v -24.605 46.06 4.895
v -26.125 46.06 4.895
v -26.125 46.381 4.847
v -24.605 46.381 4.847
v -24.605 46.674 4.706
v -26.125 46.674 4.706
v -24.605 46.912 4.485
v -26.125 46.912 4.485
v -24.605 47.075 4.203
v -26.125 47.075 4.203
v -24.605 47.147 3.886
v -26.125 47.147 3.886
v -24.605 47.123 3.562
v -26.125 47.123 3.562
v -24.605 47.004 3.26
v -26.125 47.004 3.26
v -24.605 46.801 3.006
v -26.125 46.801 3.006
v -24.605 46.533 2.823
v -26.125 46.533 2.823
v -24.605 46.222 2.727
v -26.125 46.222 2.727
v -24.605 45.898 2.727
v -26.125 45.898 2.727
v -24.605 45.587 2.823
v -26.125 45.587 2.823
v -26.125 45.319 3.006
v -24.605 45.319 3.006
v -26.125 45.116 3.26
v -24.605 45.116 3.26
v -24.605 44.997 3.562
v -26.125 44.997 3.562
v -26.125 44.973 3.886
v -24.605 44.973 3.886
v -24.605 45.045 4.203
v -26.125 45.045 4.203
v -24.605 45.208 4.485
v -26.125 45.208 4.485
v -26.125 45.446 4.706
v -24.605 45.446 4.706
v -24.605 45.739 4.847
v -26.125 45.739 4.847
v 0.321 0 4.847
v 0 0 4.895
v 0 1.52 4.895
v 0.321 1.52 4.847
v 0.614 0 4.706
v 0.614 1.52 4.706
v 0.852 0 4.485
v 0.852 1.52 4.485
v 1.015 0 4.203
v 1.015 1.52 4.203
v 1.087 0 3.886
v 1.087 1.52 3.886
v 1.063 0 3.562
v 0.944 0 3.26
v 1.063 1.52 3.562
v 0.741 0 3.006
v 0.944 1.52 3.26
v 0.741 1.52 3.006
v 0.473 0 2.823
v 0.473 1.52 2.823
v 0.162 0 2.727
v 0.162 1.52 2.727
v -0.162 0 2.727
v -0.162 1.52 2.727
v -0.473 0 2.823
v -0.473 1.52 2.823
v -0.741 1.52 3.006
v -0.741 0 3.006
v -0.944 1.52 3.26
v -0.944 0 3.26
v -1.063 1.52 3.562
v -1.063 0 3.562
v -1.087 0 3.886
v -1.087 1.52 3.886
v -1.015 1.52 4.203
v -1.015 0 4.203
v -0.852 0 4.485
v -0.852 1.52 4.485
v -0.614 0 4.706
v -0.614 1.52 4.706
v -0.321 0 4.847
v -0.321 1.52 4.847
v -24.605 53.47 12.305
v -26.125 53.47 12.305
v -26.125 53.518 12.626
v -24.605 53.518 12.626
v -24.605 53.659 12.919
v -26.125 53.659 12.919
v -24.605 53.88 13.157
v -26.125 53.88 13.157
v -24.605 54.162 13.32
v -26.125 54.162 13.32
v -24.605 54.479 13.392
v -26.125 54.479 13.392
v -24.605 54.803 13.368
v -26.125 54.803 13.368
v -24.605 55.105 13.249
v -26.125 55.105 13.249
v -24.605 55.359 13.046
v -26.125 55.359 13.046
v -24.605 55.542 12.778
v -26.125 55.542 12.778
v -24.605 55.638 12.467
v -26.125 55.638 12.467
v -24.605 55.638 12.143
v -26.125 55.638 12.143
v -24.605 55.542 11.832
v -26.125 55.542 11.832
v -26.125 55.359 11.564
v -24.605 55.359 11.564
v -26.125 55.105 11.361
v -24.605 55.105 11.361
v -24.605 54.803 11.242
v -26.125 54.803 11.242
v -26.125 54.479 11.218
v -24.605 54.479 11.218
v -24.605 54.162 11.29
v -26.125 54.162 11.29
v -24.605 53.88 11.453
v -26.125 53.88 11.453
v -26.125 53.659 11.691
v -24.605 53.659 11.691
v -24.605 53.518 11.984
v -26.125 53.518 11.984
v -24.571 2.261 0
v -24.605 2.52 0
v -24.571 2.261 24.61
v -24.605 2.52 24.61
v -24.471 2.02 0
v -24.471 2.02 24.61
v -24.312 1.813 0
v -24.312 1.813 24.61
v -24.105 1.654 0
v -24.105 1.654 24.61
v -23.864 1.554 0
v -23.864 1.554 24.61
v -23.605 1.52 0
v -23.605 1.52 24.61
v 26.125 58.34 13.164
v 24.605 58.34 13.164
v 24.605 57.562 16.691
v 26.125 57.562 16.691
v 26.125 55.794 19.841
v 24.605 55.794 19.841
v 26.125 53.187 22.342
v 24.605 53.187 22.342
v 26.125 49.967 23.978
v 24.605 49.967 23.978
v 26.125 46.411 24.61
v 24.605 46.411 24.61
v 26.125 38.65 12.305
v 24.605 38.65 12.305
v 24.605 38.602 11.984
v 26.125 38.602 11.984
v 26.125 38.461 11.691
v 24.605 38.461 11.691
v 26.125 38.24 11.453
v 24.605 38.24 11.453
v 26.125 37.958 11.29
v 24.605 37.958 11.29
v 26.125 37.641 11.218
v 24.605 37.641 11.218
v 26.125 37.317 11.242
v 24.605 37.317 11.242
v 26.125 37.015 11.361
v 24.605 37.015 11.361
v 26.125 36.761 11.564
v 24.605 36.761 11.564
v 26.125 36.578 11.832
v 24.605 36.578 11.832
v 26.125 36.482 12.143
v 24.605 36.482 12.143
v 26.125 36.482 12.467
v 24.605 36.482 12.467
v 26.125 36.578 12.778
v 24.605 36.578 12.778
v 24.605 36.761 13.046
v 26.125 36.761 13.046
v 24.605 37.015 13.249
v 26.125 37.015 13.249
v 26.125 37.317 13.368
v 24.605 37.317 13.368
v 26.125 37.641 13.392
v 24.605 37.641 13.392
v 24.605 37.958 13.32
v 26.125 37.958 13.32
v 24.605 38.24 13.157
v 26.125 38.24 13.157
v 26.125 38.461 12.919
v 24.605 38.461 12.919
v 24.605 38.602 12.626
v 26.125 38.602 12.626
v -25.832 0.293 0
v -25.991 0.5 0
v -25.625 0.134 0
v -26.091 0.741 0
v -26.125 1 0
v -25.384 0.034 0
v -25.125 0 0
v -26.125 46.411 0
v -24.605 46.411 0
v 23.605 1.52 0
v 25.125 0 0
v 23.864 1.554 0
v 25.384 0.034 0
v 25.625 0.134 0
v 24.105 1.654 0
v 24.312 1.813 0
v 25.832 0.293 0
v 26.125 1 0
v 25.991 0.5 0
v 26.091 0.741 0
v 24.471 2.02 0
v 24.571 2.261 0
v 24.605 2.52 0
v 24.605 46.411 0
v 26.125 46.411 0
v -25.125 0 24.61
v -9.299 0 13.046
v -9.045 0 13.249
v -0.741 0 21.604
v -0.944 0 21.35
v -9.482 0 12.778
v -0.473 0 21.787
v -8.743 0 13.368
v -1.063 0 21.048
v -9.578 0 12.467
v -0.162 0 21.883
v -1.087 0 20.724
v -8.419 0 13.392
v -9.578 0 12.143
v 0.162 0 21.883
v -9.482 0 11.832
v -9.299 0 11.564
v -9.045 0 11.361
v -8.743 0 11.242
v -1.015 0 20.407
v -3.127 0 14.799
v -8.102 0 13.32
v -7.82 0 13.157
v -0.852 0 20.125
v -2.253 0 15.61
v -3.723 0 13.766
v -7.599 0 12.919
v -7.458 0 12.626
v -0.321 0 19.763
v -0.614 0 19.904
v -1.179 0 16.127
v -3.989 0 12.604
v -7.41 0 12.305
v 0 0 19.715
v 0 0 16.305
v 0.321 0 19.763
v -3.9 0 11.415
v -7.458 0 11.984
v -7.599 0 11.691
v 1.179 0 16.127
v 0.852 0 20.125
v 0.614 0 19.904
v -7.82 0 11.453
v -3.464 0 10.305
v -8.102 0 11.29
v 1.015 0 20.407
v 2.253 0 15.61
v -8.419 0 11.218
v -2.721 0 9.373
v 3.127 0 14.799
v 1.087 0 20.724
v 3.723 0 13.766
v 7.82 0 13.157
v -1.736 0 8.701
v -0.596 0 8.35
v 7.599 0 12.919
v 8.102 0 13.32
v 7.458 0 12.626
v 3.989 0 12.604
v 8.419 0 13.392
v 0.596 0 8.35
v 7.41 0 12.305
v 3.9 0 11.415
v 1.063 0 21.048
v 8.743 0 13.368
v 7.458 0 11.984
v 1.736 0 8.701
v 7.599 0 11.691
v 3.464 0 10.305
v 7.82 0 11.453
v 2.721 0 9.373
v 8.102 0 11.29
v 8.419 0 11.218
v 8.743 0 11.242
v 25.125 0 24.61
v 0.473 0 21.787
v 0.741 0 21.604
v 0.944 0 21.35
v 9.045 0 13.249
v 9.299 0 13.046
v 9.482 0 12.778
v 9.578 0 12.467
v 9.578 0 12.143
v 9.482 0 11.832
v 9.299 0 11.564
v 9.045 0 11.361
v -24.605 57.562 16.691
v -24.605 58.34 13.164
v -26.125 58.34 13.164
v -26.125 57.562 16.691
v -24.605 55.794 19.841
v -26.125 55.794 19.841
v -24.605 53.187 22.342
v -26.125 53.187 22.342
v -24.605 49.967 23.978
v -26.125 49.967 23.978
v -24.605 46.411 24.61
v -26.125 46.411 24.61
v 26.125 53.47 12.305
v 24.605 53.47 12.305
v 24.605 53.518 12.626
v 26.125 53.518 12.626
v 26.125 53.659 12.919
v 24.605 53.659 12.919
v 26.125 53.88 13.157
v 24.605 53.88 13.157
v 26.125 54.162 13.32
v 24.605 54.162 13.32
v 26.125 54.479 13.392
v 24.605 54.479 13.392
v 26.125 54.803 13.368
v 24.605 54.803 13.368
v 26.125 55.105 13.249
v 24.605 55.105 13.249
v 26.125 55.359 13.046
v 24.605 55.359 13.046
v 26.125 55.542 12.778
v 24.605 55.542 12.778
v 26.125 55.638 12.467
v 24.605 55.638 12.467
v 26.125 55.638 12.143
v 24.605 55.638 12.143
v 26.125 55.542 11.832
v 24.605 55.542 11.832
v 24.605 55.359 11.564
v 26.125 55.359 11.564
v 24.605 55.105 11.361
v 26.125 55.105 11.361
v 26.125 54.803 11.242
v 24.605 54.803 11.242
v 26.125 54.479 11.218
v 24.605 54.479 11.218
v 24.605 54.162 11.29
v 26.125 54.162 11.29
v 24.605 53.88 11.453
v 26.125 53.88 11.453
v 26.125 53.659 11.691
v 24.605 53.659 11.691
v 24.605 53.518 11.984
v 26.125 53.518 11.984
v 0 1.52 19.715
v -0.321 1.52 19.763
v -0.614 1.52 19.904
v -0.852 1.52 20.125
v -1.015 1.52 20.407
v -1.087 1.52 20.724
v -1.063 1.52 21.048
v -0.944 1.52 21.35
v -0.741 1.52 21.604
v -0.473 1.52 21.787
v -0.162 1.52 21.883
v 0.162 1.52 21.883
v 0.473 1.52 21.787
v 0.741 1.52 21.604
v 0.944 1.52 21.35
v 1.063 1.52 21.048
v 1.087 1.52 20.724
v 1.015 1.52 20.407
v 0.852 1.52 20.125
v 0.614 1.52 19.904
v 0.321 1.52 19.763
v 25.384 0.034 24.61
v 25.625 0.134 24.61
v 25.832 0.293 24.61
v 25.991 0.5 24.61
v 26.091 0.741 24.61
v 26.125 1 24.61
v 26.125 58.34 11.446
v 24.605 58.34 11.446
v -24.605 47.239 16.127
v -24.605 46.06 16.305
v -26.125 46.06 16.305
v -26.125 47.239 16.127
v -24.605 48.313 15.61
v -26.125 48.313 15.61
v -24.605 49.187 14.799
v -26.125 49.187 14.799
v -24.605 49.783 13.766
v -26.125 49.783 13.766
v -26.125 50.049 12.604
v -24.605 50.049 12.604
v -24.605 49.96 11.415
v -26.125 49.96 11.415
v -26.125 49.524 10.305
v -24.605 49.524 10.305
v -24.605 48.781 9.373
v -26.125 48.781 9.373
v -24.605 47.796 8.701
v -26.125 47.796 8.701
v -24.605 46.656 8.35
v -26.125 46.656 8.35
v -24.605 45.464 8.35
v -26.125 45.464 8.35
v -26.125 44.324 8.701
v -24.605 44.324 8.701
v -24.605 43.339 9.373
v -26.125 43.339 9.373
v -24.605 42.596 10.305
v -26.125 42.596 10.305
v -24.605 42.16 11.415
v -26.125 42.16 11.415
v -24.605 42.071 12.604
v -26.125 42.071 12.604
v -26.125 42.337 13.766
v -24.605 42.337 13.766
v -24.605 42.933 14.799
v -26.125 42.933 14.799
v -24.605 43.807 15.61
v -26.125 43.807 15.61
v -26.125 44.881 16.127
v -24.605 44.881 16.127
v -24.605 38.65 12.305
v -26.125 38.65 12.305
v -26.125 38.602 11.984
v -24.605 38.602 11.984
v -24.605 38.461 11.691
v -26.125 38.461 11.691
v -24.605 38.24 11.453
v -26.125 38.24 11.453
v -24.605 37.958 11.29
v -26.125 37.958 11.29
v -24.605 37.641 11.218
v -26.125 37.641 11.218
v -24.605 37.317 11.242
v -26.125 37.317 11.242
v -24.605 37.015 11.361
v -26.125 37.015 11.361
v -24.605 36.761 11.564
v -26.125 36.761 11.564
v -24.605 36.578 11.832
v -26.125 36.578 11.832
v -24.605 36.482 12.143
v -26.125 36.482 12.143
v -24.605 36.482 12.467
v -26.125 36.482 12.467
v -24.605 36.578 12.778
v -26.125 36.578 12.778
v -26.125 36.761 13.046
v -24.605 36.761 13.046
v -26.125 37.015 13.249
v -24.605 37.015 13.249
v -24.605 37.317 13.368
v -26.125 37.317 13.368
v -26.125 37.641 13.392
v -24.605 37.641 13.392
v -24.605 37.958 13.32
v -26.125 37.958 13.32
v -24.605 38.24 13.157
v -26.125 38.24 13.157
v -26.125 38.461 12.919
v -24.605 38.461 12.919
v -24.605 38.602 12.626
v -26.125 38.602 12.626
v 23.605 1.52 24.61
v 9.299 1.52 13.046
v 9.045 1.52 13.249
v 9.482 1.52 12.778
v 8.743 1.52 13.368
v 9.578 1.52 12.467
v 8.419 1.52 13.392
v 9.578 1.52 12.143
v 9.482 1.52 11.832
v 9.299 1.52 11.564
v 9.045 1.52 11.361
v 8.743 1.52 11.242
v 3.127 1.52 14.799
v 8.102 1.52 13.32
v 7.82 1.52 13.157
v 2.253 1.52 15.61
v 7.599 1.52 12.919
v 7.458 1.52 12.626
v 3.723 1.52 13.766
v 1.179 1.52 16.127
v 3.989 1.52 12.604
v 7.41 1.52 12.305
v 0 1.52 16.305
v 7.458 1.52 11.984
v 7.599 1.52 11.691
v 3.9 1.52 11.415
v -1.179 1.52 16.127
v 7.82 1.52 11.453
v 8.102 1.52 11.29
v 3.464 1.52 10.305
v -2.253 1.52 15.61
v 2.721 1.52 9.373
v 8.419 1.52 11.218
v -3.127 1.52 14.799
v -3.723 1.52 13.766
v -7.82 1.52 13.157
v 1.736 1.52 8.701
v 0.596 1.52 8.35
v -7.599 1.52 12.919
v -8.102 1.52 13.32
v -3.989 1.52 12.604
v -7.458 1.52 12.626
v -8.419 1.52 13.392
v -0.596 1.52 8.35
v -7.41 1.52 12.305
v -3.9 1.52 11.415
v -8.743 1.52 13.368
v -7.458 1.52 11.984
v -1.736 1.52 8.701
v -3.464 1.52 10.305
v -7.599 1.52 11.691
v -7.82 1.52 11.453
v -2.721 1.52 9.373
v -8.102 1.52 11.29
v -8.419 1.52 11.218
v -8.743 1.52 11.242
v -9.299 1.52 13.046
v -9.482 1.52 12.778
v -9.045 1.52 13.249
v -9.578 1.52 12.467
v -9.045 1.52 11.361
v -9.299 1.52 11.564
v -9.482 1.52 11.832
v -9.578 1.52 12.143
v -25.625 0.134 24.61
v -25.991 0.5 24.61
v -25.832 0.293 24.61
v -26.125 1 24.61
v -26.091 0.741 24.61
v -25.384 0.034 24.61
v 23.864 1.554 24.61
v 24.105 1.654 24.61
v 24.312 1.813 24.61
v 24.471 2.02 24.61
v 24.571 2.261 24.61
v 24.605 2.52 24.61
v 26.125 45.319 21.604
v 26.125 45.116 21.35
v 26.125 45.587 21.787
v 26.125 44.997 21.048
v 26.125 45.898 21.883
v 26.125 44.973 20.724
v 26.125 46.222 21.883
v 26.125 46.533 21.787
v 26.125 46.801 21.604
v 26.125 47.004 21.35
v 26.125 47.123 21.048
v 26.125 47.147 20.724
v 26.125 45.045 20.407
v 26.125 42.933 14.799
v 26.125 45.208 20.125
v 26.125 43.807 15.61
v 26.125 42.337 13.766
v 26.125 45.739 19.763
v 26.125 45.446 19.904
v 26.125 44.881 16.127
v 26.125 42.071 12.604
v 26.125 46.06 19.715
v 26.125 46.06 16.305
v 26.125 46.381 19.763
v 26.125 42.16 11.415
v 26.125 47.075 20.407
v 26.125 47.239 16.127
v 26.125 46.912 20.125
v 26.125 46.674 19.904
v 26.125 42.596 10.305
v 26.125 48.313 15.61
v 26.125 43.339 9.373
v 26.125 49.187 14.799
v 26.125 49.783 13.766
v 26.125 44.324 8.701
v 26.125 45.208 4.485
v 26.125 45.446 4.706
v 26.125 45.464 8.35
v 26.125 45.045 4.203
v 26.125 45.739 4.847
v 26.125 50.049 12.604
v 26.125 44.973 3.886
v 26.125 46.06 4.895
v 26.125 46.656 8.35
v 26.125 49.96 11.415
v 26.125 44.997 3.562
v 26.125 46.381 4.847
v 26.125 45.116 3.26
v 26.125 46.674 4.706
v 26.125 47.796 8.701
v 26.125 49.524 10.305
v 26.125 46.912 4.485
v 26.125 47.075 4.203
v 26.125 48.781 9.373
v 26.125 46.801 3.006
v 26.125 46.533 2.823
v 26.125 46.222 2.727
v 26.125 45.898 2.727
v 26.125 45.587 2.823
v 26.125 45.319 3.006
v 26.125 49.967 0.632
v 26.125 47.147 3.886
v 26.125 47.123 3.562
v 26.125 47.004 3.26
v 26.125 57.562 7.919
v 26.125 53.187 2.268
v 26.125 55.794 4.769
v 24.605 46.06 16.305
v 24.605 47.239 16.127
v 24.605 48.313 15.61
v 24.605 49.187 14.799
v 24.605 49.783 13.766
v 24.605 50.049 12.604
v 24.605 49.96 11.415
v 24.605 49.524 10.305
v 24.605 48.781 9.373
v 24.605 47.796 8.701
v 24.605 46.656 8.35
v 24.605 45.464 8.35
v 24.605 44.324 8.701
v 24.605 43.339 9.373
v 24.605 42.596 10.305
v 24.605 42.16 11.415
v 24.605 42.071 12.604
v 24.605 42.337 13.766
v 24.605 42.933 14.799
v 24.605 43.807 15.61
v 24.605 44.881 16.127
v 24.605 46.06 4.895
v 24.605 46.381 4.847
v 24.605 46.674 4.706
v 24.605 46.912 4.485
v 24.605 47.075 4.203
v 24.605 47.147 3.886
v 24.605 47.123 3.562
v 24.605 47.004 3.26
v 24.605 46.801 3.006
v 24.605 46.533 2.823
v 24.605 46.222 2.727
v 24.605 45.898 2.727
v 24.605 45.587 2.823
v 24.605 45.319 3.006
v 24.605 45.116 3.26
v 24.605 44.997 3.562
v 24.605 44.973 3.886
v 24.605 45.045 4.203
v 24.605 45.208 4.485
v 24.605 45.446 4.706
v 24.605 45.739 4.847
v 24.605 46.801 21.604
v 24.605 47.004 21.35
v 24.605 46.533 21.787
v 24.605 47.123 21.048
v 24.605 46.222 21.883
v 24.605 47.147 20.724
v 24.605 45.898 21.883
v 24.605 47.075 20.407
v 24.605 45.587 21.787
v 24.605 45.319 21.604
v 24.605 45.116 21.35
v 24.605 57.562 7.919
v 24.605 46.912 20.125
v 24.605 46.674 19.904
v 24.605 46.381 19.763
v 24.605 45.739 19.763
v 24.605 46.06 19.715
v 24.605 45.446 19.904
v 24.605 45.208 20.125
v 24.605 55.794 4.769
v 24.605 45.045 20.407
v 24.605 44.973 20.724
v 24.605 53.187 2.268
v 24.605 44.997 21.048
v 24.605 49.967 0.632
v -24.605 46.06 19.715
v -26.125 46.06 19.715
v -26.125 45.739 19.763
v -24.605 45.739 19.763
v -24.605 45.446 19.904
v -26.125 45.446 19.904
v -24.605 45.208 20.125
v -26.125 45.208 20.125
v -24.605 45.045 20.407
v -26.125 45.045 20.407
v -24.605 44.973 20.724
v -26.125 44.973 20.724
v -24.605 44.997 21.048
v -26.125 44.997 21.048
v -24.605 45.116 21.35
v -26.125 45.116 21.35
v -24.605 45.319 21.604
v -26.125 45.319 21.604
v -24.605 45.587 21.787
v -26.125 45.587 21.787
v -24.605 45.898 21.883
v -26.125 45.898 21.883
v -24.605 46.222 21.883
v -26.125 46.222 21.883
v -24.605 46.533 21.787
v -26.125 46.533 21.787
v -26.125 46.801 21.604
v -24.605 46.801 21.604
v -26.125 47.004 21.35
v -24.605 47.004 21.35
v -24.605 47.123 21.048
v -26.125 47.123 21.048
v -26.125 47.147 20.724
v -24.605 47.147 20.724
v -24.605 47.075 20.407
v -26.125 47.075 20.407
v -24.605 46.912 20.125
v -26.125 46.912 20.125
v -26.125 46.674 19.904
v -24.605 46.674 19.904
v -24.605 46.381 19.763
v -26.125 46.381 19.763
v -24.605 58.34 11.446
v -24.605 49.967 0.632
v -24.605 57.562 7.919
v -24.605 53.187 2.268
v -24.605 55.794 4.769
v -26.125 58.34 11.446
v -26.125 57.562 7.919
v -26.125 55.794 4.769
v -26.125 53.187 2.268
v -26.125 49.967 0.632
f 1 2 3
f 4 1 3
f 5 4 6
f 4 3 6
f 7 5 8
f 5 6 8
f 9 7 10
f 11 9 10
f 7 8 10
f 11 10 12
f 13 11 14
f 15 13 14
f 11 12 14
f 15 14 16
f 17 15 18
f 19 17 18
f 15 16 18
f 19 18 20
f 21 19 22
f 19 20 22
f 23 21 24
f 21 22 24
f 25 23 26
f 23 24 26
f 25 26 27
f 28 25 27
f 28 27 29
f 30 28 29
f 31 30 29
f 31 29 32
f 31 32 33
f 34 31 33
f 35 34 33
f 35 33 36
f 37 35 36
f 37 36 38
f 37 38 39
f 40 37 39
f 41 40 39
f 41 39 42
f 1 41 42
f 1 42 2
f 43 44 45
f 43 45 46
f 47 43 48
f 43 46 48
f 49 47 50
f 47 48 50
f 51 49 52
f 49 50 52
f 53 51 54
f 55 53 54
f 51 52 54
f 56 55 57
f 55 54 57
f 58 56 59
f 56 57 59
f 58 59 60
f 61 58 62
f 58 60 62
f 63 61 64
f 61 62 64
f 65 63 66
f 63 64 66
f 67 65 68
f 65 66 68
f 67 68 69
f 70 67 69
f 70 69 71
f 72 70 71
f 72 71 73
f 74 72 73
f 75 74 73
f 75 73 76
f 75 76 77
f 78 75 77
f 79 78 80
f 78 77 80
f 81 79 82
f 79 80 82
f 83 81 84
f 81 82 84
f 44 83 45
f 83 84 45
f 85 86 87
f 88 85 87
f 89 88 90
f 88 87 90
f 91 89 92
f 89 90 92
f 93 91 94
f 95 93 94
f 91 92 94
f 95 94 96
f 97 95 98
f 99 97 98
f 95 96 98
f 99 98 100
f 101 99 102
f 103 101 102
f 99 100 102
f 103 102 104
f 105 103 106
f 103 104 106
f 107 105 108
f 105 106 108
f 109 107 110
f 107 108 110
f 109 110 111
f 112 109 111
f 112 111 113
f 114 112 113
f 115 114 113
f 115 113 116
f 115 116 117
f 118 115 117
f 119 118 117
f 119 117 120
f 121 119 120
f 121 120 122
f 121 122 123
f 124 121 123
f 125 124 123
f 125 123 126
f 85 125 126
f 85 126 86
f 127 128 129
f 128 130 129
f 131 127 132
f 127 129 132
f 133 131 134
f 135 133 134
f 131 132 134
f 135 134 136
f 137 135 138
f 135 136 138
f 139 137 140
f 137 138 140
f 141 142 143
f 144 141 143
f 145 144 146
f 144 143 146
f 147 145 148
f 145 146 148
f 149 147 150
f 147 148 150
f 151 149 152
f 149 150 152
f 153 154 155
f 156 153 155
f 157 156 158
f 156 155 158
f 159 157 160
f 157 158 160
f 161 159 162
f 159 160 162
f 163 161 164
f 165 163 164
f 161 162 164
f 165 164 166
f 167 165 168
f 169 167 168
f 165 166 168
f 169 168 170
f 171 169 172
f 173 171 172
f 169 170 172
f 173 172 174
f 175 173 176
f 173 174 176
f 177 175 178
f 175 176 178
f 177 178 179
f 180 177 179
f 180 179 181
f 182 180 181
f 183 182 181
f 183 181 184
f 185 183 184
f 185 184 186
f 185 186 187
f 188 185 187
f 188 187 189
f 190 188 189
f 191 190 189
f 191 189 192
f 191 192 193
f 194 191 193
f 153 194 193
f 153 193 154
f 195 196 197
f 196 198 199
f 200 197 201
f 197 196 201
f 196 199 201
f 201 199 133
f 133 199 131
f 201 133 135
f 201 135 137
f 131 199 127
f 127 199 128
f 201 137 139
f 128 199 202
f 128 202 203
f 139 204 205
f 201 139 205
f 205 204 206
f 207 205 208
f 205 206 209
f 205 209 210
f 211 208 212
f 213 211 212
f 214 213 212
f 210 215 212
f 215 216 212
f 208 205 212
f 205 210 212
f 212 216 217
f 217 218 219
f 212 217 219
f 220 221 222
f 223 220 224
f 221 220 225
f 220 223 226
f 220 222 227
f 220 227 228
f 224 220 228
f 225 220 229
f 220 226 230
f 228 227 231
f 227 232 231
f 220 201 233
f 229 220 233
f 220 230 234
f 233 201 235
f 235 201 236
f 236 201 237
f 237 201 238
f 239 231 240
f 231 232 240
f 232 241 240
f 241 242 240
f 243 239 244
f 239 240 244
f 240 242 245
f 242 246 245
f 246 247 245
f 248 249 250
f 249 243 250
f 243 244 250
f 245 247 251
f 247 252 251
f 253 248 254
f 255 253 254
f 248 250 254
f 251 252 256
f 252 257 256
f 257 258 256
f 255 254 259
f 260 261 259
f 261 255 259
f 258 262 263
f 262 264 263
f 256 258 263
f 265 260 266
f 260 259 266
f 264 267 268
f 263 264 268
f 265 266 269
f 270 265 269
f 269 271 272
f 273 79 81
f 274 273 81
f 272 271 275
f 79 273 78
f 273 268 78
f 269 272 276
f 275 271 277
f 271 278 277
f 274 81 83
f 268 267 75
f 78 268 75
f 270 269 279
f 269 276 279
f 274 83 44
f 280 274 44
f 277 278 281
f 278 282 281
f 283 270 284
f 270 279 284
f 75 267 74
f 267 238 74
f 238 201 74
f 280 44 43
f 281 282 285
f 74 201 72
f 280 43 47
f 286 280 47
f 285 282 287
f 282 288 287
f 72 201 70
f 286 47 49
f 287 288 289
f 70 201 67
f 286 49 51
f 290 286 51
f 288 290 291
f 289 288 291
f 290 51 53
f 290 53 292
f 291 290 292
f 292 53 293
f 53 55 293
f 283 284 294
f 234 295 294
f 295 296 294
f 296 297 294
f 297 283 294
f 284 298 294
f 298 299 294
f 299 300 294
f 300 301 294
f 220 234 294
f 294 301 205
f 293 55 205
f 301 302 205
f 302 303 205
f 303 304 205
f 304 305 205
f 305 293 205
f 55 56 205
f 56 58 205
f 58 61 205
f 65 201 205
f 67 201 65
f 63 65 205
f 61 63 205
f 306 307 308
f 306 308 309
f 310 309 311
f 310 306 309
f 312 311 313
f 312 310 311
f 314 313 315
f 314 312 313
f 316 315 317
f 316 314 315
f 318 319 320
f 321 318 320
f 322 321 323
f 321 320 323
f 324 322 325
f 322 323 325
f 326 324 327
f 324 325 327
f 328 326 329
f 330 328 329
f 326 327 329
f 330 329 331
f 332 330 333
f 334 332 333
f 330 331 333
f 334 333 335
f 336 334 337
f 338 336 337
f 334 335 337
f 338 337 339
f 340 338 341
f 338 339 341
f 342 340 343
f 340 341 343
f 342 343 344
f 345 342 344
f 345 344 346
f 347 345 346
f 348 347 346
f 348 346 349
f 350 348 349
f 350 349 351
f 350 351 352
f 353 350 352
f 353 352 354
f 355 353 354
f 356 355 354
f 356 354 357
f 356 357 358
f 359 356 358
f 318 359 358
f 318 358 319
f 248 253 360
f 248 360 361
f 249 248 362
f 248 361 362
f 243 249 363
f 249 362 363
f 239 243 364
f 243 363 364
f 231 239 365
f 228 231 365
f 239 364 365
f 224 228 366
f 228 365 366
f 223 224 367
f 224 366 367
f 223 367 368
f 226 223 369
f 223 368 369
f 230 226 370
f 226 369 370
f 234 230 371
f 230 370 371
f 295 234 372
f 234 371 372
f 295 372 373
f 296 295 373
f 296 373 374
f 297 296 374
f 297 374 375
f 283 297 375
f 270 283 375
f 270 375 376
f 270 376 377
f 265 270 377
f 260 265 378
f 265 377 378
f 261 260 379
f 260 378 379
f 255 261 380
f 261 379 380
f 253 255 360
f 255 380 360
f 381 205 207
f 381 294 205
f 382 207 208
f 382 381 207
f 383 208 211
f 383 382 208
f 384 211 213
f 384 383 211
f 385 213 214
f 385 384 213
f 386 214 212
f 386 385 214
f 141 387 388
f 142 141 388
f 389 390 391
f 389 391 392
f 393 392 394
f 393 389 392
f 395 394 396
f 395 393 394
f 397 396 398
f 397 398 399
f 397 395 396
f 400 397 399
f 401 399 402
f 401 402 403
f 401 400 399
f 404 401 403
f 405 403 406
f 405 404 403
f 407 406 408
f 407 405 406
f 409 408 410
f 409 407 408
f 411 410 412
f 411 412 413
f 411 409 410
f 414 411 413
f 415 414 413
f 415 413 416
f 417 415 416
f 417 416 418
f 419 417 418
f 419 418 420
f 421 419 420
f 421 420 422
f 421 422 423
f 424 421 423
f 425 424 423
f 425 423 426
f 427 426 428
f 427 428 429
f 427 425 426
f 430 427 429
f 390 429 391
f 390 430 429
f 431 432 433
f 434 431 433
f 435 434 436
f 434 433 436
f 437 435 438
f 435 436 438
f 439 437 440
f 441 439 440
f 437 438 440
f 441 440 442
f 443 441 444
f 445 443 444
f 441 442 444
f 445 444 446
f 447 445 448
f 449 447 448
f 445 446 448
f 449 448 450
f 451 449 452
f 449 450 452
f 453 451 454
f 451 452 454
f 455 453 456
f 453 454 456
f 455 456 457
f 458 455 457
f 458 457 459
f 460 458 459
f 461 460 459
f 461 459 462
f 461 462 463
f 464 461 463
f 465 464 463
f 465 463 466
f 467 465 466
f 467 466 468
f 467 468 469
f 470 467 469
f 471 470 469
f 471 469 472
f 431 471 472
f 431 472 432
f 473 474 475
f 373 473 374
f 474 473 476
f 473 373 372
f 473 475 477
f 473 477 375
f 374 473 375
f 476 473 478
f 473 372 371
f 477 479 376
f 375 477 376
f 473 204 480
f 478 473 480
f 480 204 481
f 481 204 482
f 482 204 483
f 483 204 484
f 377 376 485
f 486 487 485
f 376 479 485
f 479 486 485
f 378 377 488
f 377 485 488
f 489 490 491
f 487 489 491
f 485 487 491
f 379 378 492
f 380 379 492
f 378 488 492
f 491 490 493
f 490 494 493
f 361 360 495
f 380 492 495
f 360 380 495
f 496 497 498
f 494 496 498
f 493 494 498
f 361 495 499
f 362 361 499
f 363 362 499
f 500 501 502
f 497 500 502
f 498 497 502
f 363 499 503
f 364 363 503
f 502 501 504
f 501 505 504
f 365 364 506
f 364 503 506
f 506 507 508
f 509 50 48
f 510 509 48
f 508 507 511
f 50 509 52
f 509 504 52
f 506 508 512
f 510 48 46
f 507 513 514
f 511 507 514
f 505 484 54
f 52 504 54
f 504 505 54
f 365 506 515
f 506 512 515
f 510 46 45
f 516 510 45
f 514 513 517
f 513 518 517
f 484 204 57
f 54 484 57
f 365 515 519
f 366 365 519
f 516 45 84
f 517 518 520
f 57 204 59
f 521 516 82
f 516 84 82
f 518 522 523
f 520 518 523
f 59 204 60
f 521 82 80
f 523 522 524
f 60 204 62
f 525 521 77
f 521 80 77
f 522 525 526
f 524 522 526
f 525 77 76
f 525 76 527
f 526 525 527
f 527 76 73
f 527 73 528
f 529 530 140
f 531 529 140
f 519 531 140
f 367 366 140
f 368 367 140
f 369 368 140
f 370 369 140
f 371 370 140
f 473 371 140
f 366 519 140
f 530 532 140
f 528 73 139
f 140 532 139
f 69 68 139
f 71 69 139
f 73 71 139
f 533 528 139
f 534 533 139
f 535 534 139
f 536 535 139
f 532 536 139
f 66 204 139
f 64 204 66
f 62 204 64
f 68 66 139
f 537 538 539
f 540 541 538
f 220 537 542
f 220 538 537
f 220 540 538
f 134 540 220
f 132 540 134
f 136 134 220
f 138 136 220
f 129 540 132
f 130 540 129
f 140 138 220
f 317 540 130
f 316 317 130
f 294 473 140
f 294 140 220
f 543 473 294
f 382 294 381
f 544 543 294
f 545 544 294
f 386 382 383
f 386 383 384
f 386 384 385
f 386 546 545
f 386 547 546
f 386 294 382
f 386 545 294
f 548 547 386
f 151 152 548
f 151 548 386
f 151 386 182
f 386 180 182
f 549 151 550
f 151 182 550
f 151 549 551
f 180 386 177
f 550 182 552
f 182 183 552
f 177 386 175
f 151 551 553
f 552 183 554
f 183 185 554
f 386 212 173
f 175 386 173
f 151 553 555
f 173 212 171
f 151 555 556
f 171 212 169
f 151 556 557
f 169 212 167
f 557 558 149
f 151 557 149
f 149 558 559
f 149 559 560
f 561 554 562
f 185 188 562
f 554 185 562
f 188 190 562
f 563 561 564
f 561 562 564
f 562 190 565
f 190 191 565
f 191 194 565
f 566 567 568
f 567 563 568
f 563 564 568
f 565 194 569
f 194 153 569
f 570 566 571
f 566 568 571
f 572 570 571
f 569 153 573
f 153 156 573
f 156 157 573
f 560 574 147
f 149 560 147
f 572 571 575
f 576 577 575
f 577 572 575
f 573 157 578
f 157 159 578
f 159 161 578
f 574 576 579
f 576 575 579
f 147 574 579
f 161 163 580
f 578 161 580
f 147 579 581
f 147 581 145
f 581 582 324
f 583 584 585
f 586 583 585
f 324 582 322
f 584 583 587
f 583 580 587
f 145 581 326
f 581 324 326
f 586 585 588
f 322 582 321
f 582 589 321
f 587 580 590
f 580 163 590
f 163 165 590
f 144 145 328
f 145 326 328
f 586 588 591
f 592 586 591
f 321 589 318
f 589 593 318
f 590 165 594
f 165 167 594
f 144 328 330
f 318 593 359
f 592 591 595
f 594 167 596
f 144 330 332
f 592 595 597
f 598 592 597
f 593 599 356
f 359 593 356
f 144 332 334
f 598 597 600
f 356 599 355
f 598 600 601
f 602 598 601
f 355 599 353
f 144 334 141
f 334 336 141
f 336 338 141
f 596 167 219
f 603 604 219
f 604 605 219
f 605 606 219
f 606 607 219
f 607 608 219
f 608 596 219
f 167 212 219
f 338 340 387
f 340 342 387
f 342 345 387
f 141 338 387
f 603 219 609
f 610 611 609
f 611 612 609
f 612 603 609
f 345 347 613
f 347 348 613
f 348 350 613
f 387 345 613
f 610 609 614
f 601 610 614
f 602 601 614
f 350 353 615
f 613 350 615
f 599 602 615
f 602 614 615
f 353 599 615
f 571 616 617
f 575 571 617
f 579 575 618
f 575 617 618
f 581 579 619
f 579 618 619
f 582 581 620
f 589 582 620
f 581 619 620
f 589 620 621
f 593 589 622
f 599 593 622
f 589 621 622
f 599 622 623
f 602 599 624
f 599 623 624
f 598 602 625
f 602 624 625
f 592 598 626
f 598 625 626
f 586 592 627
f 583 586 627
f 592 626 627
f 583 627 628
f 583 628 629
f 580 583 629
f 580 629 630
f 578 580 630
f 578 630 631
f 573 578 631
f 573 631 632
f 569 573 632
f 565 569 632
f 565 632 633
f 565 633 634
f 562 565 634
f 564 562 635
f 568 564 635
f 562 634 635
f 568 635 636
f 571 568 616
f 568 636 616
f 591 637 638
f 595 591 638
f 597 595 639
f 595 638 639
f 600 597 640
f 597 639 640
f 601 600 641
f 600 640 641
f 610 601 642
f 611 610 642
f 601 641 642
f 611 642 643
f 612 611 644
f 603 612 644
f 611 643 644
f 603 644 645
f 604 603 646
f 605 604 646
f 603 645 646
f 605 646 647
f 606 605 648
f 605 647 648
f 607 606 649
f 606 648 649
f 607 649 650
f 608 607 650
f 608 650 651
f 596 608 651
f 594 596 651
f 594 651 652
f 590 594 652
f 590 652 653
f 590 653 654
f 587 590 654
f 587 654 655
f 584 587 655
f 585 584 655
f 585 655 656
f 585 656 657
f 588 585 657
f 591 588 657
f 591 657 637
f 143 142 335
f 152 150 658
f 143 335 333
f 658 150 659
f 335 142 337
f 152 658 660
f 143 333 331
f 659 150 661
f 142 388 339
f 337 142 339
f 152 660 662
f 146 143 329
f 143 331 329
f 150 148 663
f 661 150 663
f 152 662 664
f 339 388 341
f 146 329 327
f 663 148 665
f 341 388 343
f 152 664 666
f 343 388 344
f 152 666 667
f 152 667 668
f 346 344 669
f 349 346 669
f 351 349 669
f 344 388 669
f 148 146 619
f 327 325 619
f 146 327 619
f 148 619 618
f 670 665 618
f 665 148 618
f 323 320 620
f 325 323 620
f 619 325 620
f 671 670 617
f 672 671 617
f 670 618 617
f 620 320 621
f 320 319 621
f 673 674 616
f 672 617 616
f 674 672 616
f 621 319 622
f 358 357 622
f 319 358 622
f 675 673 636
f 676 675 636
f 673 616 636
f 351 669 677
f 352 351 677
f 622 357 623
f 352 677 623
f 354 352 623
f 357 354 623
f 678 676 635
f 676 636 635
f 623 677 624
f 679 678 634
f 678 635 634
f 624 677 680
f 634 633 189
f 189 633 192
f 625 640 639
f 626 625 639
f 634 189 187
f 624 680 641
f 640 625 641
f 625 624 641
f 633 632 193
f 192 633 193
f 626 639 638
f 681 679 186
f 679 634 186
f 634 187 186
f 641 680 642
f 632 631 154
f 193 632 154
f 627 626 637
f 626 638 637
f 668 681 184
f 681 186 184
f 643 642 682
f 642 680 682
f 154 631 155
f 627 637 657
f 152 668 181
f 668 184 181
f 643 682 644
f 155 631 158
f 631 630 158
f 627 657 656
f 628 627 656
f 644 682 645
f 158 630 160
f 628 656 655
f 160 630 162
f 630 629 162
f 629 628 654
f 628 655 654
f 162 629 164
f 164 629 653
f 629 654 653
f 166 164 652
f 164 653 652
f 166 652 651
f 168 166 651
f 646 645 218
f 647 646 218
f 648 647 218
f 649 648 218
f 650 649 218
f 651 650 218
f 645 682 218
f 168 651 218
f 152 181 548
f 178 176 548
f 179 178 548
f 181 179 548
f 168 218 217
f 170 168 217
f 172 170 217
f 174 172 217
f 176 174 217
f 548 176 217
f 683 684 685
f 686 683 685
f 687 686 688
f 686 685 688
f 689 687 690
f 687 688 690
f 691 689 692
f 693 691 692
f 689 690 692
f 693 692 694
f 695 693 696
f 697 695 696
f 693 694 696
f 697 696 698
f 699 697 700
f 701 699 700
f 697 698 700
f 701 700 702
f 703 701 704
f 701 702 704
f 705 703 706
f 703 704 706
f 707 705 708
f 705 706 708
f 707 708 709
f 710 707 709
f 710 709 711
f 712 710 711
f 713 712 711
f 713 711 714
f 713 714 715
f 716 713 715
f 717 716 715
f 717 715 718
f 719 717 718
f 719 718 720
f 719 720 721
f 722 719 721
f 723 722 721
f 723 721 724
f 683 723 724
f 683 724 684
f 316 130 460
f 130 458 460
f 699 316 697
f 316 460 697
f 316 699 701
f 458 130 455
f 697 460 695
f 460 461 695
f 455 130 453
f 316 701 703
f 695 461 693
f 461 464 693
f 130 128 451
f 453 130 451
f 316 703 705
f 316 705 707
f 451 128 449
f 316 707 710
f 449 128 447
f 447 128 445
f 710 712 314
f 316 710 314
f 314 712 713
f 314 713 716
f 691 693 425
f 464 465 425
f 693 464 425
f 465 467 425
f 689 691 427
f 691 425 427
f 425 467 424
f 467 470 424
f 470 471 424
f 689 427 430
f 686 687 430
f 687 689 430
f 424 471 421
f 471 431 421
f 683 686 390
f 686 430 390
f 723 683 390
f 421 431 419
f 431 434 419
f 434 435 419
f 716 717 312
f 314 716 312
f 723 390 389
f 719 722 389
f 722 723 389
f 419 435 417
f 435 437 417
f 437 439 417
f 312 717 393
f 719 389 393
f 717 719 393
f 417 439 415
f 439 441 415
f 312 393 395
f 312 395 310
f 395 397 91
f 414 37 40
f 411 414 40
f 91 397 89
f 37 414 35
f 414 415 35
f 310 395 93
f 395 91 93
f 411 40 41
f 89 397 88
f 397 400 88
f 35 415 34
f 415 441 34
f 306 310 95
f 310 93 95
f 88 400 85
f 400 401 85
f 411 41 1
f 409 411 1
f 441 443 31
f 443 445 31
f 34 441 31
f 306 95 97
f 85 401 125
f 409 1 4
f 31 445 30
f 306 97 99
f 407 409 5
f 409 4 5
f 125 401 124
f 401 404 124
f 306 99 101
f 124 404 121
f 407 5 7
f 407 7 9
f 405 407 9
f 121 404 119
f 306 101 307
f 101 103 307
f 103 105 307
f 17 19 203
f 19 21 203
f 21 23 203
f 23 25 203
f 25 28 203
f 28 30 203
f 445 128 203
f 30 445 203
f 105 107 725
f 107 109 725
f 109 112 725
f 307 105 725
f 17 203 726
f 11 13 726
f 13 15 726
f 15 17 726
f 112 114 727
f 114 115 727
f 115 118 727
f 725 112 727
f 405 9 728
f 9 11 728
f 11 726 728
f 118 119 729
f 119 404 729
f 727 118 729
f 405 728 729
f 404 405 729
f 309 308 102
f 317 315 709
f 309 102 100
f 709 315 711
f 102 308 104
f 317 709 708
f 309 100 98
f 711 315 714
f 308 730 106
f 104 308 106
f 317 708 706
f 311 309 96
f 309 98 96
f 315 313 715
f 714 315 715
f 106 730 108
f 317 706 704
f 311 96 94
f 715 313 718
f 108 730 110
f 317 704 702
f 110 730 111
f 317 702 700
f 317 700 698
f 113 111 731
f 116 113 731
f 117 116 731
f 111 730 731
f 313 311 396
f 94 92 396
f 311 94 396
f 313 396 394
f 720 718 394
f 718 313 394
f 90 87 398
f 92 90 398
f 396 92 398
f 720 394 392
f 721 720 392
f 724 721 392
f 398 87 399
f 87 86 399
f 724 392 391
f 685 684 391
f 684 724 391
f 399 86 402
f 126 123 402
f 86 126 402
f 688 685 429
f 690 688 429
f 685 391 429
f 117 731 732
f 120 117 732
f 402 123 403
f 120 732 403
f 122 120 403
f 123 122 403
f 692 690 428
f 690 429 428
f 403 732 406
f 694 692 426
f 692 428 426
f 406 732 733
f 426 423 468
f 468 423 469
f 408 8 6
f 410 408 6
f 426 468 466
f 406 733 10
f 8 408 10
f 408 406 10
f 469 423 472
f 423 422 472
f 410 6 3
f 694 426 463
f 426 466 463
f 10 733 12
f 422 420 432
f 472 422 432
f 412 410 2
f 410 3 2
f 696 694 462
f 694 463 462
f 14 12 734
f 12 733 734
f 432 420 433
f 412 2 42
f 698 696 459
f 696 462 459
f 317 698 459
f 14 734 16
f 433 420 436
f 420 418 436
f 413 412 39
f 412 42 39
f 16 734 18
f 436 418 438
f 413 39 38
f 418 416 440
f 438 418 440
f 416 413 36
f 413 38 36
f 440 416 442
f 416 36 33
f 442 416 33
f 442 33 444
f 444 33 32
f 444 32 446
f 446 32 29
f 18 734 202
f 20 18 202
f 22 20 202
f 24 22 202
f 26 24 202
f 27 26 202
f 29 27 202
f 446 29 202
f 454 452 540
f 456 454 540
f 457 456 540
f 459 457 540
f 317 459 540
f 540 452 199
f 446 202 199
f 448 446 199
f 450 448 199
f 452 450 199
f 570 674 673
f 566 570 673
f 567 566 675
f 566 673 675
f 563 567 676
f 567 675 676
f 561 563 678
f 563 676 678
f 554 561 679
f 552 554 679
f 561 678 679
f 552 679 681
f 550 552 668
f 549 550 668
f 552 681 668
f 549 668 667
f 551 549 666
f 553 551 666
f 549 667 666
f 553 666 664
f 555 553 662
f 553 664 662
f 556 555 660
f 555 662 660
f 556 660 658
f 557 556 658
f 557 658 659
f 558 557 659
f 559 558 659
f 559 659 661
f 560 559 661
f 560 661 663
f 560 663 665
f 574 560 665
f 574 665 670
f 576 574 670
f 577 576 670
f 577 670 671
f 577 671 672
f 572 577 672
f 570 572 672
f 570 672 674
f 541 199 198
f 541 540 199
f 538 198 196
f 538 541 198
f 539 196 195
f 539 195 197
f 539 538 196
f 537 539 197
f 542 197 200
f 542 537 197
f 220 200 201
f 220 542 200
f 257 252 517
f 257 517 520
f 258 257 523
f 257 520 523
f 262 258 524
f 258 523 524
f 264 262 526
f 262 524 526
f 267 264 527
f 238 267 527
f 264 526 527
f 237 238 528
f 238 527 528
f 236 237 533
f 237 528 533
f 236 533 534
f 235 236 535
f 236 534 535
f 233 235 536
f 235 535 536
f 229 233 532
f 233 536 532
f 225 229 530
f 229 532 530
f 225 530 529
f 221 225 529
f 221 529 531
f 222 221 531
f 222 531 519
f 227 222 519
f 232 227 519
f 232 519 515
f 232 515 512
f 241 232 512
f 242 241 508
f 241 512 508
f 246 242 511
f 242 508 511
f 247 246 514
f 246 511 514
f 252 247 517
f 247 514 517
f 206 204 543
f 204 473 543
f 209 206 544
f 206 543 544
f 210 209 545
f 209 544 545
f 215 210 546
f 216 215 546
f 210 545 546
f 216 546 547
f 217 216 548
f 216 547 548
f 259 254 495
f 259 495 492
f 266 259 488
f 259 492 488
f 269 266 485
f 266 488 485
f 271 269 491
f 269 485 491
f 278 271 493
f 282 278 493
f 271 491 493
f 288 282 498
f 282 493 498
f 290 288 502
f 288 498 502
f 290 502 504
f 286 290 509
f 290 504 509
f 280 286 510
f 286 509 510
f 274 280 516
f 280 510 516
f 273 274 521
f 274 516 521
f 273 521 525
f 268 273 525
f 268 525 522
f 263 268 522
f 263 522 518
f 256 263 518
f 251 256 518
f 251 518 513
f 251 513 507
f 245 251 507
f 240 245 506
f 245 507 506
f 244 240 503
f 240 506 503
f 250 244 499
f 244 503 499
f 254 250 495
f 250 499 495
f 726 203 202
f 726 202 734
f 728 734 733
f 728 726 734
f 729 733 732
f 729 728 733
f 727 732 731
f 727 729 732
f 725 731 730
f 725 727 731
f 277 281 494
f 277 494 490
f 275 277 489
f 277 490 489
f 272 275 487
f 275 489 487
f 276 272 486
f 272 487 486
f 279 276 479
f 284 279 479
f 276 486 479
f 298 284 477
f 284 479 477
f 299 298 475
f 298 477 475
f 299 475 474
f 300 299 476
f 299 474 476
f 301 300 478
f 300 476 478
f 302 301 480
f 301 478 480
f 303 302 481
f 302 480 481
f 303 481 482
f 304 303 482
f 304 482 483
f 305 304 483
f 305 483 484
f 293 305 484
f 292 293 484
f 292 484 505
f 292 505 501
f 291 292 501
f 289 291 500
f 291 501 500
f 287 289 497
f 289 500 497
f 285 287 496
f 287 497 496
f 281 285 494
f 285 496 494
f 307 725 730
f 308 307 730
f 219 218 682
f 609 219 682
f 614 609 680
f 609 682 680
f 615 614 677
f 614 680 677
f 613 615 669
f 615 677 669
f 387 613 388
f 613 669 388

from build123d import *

# Parameters (mm, degrees)
BOSS_EXTRUDE1_DEPTH    = 24.61
CUT_EXTRUDE5_START     = -1.52
CUT_EXTRUDE5_OUTLINE_R = 4
CUT_EXTRUDE5_DEPTH     = 1.52
SKETCH4_R              = 1.09
CUT_EXTRUDE6_DEPTH     = 100
CIRPATTERN1_COUNT      = 4
SKETCH5_R              = 4
CUT_EXTRUDE7_DEPTH     = 50
SKETCH6_R              = 1.09
CUT_EXTRUDE8_DEPTH     = 50
CIRPATTERN2_COUNT      = 4
FILLET1_R              = 1


# Read off the part's stored shape, not the designer's step: Cut-Extrude5
with BuildPart() as part:
    # Sketch1 → Boss-Extrude1 (new body)
    with BuildSketch(Plane.XY):
        Polygon((-26.125, 58.34), (-26.125, 0), (26.125, 0), (26.125, 58.34), (24.605, 58.34), (24.605, 1.52), (-24.605, 1.52), (-24.605, 58.34), align=None)
    extrude(amount=BOSS_EXTRUDE1_DEPTH)

    # Cut-Extrude5 outline → Cut-Extrude5 (cut)
    with BuildSketch(Plane.ZY.offset(26.125).offset(CUT_EXTRUDE5_START)):
        with BuildLine():
            ThreePointArc((0, 46.410820467), (3.42252503, 54.582777623), (11.446105362, 58.34))
            Line((11.446105362, 58.34), (0, 58.34))
            Line((0, 58.34), (0, 46.410820467))
        make_face()
        with BuildLine():
            Line((24.61, 58.34), (13.163894638, 58.34))
            ThreePointArc((13.163894638, 58.34), (21.18747497, 54.582777623), (24.61, 46.410820467))
            Line((24.61, 46.410820467), (24.61, 58.34))
        make_face()
        with Locations((12.305, 46.06)):
            Circle(CUT_EXTRUDE5_OUTLINE_R)
    cut_extrude5 = extrude(amount=CUT_EXTRUDE5_DEPTH, mode=Mode.SUBTRACT)

    # Mirror1: Cut-Extrude5 across plane
    add(cut_extrude5.mirror(Plane(origin=(0, 0, 0), x_dir=(0, 0, 1), z_dir=(1, 0, 0))), mode=Mode.SUBTRACT)

    # Sketch4 → Cut-Extrude6 (cut)
    with BuildSketch(Plane.ZY.offset(26.125)):
        with Locations(Location((12.305, 54.56, 0), (0, 0, 270))):
            Circle(SKETCH4_R)
    cut_extrude6 = extrude(amount=-CUT_EXTRUDE6_DEPTH, mode=Mode.SUBTRACT)

    # CirPattern1: Cut-Extrude6 ×4 about axis
    cirpattern1_axis = Axis((0, 46.06, 12.305), (1, 0, 0))
    for i in range(1, CIRPATTERN1_COUNT):
        add(cut_extrude6.rotate(cirpattern1_axis, i * 360 / CIRPATTERN1_COUNT), mode=Mode.SUBTRACT)

    # Sketch5 → Cut-Extrude7 (cut, symmetric)
    with BuildSketch(Plane(origin=(0, 1.52, 0), x_dir=(1, 0, 0), z_dir=(0, 1, 0))):
        with Locations(Location((0, -12.305, 0), (0, 0, 270))):
            Circle(SKETCH5_R)
    extrude(amount=CUT_EXTRUDE7_DEPTH, both=True, mode=Mode.SUBTRACT)

    # Sketch6 → Cut-Extrude8 (cut, symmetric)
    with BuildSketch(Plane(origin=(0, 1.52, 0), x_dir=(1, 0, 0), z_dir=(0, 1, 0))):
        with Locations(Location((0, -3.805, 0), (0, 0, 270))):
            Circle(SKETCH6_R)
    cut_extrude8 = extrude(amount=CUT_EXTRUDE8_DEPTH, both=True, mode=Mode.SUBTRACT)

    # CirPattern2: Cut-Extrude8 ×4 about axis
    cirpattern2_axis = Axis((0, 0, 12.305), (0, 1, 0))
    for i in range(1, CIRPATTERN2_COUNT):
        add(cut_extrude8.rotate(cirpattern2_axis, i * 360 / CIRPATTERN2_COUNT), mode=Mode.SUBTRACT)

    # Fillet1
    fillet1_edges = [part.edges().sort_by_distance(p)[0] for p in [
        (-24.605, 1.52, 12.305),
        (24.605, 1.52, 12.305),
        (26.125, 0, 12.305),
        (-26.125, 0, 12.305),
    ]]
    fillet(fillet1_edges, radius=FILLET1_R)


solid = part.part
